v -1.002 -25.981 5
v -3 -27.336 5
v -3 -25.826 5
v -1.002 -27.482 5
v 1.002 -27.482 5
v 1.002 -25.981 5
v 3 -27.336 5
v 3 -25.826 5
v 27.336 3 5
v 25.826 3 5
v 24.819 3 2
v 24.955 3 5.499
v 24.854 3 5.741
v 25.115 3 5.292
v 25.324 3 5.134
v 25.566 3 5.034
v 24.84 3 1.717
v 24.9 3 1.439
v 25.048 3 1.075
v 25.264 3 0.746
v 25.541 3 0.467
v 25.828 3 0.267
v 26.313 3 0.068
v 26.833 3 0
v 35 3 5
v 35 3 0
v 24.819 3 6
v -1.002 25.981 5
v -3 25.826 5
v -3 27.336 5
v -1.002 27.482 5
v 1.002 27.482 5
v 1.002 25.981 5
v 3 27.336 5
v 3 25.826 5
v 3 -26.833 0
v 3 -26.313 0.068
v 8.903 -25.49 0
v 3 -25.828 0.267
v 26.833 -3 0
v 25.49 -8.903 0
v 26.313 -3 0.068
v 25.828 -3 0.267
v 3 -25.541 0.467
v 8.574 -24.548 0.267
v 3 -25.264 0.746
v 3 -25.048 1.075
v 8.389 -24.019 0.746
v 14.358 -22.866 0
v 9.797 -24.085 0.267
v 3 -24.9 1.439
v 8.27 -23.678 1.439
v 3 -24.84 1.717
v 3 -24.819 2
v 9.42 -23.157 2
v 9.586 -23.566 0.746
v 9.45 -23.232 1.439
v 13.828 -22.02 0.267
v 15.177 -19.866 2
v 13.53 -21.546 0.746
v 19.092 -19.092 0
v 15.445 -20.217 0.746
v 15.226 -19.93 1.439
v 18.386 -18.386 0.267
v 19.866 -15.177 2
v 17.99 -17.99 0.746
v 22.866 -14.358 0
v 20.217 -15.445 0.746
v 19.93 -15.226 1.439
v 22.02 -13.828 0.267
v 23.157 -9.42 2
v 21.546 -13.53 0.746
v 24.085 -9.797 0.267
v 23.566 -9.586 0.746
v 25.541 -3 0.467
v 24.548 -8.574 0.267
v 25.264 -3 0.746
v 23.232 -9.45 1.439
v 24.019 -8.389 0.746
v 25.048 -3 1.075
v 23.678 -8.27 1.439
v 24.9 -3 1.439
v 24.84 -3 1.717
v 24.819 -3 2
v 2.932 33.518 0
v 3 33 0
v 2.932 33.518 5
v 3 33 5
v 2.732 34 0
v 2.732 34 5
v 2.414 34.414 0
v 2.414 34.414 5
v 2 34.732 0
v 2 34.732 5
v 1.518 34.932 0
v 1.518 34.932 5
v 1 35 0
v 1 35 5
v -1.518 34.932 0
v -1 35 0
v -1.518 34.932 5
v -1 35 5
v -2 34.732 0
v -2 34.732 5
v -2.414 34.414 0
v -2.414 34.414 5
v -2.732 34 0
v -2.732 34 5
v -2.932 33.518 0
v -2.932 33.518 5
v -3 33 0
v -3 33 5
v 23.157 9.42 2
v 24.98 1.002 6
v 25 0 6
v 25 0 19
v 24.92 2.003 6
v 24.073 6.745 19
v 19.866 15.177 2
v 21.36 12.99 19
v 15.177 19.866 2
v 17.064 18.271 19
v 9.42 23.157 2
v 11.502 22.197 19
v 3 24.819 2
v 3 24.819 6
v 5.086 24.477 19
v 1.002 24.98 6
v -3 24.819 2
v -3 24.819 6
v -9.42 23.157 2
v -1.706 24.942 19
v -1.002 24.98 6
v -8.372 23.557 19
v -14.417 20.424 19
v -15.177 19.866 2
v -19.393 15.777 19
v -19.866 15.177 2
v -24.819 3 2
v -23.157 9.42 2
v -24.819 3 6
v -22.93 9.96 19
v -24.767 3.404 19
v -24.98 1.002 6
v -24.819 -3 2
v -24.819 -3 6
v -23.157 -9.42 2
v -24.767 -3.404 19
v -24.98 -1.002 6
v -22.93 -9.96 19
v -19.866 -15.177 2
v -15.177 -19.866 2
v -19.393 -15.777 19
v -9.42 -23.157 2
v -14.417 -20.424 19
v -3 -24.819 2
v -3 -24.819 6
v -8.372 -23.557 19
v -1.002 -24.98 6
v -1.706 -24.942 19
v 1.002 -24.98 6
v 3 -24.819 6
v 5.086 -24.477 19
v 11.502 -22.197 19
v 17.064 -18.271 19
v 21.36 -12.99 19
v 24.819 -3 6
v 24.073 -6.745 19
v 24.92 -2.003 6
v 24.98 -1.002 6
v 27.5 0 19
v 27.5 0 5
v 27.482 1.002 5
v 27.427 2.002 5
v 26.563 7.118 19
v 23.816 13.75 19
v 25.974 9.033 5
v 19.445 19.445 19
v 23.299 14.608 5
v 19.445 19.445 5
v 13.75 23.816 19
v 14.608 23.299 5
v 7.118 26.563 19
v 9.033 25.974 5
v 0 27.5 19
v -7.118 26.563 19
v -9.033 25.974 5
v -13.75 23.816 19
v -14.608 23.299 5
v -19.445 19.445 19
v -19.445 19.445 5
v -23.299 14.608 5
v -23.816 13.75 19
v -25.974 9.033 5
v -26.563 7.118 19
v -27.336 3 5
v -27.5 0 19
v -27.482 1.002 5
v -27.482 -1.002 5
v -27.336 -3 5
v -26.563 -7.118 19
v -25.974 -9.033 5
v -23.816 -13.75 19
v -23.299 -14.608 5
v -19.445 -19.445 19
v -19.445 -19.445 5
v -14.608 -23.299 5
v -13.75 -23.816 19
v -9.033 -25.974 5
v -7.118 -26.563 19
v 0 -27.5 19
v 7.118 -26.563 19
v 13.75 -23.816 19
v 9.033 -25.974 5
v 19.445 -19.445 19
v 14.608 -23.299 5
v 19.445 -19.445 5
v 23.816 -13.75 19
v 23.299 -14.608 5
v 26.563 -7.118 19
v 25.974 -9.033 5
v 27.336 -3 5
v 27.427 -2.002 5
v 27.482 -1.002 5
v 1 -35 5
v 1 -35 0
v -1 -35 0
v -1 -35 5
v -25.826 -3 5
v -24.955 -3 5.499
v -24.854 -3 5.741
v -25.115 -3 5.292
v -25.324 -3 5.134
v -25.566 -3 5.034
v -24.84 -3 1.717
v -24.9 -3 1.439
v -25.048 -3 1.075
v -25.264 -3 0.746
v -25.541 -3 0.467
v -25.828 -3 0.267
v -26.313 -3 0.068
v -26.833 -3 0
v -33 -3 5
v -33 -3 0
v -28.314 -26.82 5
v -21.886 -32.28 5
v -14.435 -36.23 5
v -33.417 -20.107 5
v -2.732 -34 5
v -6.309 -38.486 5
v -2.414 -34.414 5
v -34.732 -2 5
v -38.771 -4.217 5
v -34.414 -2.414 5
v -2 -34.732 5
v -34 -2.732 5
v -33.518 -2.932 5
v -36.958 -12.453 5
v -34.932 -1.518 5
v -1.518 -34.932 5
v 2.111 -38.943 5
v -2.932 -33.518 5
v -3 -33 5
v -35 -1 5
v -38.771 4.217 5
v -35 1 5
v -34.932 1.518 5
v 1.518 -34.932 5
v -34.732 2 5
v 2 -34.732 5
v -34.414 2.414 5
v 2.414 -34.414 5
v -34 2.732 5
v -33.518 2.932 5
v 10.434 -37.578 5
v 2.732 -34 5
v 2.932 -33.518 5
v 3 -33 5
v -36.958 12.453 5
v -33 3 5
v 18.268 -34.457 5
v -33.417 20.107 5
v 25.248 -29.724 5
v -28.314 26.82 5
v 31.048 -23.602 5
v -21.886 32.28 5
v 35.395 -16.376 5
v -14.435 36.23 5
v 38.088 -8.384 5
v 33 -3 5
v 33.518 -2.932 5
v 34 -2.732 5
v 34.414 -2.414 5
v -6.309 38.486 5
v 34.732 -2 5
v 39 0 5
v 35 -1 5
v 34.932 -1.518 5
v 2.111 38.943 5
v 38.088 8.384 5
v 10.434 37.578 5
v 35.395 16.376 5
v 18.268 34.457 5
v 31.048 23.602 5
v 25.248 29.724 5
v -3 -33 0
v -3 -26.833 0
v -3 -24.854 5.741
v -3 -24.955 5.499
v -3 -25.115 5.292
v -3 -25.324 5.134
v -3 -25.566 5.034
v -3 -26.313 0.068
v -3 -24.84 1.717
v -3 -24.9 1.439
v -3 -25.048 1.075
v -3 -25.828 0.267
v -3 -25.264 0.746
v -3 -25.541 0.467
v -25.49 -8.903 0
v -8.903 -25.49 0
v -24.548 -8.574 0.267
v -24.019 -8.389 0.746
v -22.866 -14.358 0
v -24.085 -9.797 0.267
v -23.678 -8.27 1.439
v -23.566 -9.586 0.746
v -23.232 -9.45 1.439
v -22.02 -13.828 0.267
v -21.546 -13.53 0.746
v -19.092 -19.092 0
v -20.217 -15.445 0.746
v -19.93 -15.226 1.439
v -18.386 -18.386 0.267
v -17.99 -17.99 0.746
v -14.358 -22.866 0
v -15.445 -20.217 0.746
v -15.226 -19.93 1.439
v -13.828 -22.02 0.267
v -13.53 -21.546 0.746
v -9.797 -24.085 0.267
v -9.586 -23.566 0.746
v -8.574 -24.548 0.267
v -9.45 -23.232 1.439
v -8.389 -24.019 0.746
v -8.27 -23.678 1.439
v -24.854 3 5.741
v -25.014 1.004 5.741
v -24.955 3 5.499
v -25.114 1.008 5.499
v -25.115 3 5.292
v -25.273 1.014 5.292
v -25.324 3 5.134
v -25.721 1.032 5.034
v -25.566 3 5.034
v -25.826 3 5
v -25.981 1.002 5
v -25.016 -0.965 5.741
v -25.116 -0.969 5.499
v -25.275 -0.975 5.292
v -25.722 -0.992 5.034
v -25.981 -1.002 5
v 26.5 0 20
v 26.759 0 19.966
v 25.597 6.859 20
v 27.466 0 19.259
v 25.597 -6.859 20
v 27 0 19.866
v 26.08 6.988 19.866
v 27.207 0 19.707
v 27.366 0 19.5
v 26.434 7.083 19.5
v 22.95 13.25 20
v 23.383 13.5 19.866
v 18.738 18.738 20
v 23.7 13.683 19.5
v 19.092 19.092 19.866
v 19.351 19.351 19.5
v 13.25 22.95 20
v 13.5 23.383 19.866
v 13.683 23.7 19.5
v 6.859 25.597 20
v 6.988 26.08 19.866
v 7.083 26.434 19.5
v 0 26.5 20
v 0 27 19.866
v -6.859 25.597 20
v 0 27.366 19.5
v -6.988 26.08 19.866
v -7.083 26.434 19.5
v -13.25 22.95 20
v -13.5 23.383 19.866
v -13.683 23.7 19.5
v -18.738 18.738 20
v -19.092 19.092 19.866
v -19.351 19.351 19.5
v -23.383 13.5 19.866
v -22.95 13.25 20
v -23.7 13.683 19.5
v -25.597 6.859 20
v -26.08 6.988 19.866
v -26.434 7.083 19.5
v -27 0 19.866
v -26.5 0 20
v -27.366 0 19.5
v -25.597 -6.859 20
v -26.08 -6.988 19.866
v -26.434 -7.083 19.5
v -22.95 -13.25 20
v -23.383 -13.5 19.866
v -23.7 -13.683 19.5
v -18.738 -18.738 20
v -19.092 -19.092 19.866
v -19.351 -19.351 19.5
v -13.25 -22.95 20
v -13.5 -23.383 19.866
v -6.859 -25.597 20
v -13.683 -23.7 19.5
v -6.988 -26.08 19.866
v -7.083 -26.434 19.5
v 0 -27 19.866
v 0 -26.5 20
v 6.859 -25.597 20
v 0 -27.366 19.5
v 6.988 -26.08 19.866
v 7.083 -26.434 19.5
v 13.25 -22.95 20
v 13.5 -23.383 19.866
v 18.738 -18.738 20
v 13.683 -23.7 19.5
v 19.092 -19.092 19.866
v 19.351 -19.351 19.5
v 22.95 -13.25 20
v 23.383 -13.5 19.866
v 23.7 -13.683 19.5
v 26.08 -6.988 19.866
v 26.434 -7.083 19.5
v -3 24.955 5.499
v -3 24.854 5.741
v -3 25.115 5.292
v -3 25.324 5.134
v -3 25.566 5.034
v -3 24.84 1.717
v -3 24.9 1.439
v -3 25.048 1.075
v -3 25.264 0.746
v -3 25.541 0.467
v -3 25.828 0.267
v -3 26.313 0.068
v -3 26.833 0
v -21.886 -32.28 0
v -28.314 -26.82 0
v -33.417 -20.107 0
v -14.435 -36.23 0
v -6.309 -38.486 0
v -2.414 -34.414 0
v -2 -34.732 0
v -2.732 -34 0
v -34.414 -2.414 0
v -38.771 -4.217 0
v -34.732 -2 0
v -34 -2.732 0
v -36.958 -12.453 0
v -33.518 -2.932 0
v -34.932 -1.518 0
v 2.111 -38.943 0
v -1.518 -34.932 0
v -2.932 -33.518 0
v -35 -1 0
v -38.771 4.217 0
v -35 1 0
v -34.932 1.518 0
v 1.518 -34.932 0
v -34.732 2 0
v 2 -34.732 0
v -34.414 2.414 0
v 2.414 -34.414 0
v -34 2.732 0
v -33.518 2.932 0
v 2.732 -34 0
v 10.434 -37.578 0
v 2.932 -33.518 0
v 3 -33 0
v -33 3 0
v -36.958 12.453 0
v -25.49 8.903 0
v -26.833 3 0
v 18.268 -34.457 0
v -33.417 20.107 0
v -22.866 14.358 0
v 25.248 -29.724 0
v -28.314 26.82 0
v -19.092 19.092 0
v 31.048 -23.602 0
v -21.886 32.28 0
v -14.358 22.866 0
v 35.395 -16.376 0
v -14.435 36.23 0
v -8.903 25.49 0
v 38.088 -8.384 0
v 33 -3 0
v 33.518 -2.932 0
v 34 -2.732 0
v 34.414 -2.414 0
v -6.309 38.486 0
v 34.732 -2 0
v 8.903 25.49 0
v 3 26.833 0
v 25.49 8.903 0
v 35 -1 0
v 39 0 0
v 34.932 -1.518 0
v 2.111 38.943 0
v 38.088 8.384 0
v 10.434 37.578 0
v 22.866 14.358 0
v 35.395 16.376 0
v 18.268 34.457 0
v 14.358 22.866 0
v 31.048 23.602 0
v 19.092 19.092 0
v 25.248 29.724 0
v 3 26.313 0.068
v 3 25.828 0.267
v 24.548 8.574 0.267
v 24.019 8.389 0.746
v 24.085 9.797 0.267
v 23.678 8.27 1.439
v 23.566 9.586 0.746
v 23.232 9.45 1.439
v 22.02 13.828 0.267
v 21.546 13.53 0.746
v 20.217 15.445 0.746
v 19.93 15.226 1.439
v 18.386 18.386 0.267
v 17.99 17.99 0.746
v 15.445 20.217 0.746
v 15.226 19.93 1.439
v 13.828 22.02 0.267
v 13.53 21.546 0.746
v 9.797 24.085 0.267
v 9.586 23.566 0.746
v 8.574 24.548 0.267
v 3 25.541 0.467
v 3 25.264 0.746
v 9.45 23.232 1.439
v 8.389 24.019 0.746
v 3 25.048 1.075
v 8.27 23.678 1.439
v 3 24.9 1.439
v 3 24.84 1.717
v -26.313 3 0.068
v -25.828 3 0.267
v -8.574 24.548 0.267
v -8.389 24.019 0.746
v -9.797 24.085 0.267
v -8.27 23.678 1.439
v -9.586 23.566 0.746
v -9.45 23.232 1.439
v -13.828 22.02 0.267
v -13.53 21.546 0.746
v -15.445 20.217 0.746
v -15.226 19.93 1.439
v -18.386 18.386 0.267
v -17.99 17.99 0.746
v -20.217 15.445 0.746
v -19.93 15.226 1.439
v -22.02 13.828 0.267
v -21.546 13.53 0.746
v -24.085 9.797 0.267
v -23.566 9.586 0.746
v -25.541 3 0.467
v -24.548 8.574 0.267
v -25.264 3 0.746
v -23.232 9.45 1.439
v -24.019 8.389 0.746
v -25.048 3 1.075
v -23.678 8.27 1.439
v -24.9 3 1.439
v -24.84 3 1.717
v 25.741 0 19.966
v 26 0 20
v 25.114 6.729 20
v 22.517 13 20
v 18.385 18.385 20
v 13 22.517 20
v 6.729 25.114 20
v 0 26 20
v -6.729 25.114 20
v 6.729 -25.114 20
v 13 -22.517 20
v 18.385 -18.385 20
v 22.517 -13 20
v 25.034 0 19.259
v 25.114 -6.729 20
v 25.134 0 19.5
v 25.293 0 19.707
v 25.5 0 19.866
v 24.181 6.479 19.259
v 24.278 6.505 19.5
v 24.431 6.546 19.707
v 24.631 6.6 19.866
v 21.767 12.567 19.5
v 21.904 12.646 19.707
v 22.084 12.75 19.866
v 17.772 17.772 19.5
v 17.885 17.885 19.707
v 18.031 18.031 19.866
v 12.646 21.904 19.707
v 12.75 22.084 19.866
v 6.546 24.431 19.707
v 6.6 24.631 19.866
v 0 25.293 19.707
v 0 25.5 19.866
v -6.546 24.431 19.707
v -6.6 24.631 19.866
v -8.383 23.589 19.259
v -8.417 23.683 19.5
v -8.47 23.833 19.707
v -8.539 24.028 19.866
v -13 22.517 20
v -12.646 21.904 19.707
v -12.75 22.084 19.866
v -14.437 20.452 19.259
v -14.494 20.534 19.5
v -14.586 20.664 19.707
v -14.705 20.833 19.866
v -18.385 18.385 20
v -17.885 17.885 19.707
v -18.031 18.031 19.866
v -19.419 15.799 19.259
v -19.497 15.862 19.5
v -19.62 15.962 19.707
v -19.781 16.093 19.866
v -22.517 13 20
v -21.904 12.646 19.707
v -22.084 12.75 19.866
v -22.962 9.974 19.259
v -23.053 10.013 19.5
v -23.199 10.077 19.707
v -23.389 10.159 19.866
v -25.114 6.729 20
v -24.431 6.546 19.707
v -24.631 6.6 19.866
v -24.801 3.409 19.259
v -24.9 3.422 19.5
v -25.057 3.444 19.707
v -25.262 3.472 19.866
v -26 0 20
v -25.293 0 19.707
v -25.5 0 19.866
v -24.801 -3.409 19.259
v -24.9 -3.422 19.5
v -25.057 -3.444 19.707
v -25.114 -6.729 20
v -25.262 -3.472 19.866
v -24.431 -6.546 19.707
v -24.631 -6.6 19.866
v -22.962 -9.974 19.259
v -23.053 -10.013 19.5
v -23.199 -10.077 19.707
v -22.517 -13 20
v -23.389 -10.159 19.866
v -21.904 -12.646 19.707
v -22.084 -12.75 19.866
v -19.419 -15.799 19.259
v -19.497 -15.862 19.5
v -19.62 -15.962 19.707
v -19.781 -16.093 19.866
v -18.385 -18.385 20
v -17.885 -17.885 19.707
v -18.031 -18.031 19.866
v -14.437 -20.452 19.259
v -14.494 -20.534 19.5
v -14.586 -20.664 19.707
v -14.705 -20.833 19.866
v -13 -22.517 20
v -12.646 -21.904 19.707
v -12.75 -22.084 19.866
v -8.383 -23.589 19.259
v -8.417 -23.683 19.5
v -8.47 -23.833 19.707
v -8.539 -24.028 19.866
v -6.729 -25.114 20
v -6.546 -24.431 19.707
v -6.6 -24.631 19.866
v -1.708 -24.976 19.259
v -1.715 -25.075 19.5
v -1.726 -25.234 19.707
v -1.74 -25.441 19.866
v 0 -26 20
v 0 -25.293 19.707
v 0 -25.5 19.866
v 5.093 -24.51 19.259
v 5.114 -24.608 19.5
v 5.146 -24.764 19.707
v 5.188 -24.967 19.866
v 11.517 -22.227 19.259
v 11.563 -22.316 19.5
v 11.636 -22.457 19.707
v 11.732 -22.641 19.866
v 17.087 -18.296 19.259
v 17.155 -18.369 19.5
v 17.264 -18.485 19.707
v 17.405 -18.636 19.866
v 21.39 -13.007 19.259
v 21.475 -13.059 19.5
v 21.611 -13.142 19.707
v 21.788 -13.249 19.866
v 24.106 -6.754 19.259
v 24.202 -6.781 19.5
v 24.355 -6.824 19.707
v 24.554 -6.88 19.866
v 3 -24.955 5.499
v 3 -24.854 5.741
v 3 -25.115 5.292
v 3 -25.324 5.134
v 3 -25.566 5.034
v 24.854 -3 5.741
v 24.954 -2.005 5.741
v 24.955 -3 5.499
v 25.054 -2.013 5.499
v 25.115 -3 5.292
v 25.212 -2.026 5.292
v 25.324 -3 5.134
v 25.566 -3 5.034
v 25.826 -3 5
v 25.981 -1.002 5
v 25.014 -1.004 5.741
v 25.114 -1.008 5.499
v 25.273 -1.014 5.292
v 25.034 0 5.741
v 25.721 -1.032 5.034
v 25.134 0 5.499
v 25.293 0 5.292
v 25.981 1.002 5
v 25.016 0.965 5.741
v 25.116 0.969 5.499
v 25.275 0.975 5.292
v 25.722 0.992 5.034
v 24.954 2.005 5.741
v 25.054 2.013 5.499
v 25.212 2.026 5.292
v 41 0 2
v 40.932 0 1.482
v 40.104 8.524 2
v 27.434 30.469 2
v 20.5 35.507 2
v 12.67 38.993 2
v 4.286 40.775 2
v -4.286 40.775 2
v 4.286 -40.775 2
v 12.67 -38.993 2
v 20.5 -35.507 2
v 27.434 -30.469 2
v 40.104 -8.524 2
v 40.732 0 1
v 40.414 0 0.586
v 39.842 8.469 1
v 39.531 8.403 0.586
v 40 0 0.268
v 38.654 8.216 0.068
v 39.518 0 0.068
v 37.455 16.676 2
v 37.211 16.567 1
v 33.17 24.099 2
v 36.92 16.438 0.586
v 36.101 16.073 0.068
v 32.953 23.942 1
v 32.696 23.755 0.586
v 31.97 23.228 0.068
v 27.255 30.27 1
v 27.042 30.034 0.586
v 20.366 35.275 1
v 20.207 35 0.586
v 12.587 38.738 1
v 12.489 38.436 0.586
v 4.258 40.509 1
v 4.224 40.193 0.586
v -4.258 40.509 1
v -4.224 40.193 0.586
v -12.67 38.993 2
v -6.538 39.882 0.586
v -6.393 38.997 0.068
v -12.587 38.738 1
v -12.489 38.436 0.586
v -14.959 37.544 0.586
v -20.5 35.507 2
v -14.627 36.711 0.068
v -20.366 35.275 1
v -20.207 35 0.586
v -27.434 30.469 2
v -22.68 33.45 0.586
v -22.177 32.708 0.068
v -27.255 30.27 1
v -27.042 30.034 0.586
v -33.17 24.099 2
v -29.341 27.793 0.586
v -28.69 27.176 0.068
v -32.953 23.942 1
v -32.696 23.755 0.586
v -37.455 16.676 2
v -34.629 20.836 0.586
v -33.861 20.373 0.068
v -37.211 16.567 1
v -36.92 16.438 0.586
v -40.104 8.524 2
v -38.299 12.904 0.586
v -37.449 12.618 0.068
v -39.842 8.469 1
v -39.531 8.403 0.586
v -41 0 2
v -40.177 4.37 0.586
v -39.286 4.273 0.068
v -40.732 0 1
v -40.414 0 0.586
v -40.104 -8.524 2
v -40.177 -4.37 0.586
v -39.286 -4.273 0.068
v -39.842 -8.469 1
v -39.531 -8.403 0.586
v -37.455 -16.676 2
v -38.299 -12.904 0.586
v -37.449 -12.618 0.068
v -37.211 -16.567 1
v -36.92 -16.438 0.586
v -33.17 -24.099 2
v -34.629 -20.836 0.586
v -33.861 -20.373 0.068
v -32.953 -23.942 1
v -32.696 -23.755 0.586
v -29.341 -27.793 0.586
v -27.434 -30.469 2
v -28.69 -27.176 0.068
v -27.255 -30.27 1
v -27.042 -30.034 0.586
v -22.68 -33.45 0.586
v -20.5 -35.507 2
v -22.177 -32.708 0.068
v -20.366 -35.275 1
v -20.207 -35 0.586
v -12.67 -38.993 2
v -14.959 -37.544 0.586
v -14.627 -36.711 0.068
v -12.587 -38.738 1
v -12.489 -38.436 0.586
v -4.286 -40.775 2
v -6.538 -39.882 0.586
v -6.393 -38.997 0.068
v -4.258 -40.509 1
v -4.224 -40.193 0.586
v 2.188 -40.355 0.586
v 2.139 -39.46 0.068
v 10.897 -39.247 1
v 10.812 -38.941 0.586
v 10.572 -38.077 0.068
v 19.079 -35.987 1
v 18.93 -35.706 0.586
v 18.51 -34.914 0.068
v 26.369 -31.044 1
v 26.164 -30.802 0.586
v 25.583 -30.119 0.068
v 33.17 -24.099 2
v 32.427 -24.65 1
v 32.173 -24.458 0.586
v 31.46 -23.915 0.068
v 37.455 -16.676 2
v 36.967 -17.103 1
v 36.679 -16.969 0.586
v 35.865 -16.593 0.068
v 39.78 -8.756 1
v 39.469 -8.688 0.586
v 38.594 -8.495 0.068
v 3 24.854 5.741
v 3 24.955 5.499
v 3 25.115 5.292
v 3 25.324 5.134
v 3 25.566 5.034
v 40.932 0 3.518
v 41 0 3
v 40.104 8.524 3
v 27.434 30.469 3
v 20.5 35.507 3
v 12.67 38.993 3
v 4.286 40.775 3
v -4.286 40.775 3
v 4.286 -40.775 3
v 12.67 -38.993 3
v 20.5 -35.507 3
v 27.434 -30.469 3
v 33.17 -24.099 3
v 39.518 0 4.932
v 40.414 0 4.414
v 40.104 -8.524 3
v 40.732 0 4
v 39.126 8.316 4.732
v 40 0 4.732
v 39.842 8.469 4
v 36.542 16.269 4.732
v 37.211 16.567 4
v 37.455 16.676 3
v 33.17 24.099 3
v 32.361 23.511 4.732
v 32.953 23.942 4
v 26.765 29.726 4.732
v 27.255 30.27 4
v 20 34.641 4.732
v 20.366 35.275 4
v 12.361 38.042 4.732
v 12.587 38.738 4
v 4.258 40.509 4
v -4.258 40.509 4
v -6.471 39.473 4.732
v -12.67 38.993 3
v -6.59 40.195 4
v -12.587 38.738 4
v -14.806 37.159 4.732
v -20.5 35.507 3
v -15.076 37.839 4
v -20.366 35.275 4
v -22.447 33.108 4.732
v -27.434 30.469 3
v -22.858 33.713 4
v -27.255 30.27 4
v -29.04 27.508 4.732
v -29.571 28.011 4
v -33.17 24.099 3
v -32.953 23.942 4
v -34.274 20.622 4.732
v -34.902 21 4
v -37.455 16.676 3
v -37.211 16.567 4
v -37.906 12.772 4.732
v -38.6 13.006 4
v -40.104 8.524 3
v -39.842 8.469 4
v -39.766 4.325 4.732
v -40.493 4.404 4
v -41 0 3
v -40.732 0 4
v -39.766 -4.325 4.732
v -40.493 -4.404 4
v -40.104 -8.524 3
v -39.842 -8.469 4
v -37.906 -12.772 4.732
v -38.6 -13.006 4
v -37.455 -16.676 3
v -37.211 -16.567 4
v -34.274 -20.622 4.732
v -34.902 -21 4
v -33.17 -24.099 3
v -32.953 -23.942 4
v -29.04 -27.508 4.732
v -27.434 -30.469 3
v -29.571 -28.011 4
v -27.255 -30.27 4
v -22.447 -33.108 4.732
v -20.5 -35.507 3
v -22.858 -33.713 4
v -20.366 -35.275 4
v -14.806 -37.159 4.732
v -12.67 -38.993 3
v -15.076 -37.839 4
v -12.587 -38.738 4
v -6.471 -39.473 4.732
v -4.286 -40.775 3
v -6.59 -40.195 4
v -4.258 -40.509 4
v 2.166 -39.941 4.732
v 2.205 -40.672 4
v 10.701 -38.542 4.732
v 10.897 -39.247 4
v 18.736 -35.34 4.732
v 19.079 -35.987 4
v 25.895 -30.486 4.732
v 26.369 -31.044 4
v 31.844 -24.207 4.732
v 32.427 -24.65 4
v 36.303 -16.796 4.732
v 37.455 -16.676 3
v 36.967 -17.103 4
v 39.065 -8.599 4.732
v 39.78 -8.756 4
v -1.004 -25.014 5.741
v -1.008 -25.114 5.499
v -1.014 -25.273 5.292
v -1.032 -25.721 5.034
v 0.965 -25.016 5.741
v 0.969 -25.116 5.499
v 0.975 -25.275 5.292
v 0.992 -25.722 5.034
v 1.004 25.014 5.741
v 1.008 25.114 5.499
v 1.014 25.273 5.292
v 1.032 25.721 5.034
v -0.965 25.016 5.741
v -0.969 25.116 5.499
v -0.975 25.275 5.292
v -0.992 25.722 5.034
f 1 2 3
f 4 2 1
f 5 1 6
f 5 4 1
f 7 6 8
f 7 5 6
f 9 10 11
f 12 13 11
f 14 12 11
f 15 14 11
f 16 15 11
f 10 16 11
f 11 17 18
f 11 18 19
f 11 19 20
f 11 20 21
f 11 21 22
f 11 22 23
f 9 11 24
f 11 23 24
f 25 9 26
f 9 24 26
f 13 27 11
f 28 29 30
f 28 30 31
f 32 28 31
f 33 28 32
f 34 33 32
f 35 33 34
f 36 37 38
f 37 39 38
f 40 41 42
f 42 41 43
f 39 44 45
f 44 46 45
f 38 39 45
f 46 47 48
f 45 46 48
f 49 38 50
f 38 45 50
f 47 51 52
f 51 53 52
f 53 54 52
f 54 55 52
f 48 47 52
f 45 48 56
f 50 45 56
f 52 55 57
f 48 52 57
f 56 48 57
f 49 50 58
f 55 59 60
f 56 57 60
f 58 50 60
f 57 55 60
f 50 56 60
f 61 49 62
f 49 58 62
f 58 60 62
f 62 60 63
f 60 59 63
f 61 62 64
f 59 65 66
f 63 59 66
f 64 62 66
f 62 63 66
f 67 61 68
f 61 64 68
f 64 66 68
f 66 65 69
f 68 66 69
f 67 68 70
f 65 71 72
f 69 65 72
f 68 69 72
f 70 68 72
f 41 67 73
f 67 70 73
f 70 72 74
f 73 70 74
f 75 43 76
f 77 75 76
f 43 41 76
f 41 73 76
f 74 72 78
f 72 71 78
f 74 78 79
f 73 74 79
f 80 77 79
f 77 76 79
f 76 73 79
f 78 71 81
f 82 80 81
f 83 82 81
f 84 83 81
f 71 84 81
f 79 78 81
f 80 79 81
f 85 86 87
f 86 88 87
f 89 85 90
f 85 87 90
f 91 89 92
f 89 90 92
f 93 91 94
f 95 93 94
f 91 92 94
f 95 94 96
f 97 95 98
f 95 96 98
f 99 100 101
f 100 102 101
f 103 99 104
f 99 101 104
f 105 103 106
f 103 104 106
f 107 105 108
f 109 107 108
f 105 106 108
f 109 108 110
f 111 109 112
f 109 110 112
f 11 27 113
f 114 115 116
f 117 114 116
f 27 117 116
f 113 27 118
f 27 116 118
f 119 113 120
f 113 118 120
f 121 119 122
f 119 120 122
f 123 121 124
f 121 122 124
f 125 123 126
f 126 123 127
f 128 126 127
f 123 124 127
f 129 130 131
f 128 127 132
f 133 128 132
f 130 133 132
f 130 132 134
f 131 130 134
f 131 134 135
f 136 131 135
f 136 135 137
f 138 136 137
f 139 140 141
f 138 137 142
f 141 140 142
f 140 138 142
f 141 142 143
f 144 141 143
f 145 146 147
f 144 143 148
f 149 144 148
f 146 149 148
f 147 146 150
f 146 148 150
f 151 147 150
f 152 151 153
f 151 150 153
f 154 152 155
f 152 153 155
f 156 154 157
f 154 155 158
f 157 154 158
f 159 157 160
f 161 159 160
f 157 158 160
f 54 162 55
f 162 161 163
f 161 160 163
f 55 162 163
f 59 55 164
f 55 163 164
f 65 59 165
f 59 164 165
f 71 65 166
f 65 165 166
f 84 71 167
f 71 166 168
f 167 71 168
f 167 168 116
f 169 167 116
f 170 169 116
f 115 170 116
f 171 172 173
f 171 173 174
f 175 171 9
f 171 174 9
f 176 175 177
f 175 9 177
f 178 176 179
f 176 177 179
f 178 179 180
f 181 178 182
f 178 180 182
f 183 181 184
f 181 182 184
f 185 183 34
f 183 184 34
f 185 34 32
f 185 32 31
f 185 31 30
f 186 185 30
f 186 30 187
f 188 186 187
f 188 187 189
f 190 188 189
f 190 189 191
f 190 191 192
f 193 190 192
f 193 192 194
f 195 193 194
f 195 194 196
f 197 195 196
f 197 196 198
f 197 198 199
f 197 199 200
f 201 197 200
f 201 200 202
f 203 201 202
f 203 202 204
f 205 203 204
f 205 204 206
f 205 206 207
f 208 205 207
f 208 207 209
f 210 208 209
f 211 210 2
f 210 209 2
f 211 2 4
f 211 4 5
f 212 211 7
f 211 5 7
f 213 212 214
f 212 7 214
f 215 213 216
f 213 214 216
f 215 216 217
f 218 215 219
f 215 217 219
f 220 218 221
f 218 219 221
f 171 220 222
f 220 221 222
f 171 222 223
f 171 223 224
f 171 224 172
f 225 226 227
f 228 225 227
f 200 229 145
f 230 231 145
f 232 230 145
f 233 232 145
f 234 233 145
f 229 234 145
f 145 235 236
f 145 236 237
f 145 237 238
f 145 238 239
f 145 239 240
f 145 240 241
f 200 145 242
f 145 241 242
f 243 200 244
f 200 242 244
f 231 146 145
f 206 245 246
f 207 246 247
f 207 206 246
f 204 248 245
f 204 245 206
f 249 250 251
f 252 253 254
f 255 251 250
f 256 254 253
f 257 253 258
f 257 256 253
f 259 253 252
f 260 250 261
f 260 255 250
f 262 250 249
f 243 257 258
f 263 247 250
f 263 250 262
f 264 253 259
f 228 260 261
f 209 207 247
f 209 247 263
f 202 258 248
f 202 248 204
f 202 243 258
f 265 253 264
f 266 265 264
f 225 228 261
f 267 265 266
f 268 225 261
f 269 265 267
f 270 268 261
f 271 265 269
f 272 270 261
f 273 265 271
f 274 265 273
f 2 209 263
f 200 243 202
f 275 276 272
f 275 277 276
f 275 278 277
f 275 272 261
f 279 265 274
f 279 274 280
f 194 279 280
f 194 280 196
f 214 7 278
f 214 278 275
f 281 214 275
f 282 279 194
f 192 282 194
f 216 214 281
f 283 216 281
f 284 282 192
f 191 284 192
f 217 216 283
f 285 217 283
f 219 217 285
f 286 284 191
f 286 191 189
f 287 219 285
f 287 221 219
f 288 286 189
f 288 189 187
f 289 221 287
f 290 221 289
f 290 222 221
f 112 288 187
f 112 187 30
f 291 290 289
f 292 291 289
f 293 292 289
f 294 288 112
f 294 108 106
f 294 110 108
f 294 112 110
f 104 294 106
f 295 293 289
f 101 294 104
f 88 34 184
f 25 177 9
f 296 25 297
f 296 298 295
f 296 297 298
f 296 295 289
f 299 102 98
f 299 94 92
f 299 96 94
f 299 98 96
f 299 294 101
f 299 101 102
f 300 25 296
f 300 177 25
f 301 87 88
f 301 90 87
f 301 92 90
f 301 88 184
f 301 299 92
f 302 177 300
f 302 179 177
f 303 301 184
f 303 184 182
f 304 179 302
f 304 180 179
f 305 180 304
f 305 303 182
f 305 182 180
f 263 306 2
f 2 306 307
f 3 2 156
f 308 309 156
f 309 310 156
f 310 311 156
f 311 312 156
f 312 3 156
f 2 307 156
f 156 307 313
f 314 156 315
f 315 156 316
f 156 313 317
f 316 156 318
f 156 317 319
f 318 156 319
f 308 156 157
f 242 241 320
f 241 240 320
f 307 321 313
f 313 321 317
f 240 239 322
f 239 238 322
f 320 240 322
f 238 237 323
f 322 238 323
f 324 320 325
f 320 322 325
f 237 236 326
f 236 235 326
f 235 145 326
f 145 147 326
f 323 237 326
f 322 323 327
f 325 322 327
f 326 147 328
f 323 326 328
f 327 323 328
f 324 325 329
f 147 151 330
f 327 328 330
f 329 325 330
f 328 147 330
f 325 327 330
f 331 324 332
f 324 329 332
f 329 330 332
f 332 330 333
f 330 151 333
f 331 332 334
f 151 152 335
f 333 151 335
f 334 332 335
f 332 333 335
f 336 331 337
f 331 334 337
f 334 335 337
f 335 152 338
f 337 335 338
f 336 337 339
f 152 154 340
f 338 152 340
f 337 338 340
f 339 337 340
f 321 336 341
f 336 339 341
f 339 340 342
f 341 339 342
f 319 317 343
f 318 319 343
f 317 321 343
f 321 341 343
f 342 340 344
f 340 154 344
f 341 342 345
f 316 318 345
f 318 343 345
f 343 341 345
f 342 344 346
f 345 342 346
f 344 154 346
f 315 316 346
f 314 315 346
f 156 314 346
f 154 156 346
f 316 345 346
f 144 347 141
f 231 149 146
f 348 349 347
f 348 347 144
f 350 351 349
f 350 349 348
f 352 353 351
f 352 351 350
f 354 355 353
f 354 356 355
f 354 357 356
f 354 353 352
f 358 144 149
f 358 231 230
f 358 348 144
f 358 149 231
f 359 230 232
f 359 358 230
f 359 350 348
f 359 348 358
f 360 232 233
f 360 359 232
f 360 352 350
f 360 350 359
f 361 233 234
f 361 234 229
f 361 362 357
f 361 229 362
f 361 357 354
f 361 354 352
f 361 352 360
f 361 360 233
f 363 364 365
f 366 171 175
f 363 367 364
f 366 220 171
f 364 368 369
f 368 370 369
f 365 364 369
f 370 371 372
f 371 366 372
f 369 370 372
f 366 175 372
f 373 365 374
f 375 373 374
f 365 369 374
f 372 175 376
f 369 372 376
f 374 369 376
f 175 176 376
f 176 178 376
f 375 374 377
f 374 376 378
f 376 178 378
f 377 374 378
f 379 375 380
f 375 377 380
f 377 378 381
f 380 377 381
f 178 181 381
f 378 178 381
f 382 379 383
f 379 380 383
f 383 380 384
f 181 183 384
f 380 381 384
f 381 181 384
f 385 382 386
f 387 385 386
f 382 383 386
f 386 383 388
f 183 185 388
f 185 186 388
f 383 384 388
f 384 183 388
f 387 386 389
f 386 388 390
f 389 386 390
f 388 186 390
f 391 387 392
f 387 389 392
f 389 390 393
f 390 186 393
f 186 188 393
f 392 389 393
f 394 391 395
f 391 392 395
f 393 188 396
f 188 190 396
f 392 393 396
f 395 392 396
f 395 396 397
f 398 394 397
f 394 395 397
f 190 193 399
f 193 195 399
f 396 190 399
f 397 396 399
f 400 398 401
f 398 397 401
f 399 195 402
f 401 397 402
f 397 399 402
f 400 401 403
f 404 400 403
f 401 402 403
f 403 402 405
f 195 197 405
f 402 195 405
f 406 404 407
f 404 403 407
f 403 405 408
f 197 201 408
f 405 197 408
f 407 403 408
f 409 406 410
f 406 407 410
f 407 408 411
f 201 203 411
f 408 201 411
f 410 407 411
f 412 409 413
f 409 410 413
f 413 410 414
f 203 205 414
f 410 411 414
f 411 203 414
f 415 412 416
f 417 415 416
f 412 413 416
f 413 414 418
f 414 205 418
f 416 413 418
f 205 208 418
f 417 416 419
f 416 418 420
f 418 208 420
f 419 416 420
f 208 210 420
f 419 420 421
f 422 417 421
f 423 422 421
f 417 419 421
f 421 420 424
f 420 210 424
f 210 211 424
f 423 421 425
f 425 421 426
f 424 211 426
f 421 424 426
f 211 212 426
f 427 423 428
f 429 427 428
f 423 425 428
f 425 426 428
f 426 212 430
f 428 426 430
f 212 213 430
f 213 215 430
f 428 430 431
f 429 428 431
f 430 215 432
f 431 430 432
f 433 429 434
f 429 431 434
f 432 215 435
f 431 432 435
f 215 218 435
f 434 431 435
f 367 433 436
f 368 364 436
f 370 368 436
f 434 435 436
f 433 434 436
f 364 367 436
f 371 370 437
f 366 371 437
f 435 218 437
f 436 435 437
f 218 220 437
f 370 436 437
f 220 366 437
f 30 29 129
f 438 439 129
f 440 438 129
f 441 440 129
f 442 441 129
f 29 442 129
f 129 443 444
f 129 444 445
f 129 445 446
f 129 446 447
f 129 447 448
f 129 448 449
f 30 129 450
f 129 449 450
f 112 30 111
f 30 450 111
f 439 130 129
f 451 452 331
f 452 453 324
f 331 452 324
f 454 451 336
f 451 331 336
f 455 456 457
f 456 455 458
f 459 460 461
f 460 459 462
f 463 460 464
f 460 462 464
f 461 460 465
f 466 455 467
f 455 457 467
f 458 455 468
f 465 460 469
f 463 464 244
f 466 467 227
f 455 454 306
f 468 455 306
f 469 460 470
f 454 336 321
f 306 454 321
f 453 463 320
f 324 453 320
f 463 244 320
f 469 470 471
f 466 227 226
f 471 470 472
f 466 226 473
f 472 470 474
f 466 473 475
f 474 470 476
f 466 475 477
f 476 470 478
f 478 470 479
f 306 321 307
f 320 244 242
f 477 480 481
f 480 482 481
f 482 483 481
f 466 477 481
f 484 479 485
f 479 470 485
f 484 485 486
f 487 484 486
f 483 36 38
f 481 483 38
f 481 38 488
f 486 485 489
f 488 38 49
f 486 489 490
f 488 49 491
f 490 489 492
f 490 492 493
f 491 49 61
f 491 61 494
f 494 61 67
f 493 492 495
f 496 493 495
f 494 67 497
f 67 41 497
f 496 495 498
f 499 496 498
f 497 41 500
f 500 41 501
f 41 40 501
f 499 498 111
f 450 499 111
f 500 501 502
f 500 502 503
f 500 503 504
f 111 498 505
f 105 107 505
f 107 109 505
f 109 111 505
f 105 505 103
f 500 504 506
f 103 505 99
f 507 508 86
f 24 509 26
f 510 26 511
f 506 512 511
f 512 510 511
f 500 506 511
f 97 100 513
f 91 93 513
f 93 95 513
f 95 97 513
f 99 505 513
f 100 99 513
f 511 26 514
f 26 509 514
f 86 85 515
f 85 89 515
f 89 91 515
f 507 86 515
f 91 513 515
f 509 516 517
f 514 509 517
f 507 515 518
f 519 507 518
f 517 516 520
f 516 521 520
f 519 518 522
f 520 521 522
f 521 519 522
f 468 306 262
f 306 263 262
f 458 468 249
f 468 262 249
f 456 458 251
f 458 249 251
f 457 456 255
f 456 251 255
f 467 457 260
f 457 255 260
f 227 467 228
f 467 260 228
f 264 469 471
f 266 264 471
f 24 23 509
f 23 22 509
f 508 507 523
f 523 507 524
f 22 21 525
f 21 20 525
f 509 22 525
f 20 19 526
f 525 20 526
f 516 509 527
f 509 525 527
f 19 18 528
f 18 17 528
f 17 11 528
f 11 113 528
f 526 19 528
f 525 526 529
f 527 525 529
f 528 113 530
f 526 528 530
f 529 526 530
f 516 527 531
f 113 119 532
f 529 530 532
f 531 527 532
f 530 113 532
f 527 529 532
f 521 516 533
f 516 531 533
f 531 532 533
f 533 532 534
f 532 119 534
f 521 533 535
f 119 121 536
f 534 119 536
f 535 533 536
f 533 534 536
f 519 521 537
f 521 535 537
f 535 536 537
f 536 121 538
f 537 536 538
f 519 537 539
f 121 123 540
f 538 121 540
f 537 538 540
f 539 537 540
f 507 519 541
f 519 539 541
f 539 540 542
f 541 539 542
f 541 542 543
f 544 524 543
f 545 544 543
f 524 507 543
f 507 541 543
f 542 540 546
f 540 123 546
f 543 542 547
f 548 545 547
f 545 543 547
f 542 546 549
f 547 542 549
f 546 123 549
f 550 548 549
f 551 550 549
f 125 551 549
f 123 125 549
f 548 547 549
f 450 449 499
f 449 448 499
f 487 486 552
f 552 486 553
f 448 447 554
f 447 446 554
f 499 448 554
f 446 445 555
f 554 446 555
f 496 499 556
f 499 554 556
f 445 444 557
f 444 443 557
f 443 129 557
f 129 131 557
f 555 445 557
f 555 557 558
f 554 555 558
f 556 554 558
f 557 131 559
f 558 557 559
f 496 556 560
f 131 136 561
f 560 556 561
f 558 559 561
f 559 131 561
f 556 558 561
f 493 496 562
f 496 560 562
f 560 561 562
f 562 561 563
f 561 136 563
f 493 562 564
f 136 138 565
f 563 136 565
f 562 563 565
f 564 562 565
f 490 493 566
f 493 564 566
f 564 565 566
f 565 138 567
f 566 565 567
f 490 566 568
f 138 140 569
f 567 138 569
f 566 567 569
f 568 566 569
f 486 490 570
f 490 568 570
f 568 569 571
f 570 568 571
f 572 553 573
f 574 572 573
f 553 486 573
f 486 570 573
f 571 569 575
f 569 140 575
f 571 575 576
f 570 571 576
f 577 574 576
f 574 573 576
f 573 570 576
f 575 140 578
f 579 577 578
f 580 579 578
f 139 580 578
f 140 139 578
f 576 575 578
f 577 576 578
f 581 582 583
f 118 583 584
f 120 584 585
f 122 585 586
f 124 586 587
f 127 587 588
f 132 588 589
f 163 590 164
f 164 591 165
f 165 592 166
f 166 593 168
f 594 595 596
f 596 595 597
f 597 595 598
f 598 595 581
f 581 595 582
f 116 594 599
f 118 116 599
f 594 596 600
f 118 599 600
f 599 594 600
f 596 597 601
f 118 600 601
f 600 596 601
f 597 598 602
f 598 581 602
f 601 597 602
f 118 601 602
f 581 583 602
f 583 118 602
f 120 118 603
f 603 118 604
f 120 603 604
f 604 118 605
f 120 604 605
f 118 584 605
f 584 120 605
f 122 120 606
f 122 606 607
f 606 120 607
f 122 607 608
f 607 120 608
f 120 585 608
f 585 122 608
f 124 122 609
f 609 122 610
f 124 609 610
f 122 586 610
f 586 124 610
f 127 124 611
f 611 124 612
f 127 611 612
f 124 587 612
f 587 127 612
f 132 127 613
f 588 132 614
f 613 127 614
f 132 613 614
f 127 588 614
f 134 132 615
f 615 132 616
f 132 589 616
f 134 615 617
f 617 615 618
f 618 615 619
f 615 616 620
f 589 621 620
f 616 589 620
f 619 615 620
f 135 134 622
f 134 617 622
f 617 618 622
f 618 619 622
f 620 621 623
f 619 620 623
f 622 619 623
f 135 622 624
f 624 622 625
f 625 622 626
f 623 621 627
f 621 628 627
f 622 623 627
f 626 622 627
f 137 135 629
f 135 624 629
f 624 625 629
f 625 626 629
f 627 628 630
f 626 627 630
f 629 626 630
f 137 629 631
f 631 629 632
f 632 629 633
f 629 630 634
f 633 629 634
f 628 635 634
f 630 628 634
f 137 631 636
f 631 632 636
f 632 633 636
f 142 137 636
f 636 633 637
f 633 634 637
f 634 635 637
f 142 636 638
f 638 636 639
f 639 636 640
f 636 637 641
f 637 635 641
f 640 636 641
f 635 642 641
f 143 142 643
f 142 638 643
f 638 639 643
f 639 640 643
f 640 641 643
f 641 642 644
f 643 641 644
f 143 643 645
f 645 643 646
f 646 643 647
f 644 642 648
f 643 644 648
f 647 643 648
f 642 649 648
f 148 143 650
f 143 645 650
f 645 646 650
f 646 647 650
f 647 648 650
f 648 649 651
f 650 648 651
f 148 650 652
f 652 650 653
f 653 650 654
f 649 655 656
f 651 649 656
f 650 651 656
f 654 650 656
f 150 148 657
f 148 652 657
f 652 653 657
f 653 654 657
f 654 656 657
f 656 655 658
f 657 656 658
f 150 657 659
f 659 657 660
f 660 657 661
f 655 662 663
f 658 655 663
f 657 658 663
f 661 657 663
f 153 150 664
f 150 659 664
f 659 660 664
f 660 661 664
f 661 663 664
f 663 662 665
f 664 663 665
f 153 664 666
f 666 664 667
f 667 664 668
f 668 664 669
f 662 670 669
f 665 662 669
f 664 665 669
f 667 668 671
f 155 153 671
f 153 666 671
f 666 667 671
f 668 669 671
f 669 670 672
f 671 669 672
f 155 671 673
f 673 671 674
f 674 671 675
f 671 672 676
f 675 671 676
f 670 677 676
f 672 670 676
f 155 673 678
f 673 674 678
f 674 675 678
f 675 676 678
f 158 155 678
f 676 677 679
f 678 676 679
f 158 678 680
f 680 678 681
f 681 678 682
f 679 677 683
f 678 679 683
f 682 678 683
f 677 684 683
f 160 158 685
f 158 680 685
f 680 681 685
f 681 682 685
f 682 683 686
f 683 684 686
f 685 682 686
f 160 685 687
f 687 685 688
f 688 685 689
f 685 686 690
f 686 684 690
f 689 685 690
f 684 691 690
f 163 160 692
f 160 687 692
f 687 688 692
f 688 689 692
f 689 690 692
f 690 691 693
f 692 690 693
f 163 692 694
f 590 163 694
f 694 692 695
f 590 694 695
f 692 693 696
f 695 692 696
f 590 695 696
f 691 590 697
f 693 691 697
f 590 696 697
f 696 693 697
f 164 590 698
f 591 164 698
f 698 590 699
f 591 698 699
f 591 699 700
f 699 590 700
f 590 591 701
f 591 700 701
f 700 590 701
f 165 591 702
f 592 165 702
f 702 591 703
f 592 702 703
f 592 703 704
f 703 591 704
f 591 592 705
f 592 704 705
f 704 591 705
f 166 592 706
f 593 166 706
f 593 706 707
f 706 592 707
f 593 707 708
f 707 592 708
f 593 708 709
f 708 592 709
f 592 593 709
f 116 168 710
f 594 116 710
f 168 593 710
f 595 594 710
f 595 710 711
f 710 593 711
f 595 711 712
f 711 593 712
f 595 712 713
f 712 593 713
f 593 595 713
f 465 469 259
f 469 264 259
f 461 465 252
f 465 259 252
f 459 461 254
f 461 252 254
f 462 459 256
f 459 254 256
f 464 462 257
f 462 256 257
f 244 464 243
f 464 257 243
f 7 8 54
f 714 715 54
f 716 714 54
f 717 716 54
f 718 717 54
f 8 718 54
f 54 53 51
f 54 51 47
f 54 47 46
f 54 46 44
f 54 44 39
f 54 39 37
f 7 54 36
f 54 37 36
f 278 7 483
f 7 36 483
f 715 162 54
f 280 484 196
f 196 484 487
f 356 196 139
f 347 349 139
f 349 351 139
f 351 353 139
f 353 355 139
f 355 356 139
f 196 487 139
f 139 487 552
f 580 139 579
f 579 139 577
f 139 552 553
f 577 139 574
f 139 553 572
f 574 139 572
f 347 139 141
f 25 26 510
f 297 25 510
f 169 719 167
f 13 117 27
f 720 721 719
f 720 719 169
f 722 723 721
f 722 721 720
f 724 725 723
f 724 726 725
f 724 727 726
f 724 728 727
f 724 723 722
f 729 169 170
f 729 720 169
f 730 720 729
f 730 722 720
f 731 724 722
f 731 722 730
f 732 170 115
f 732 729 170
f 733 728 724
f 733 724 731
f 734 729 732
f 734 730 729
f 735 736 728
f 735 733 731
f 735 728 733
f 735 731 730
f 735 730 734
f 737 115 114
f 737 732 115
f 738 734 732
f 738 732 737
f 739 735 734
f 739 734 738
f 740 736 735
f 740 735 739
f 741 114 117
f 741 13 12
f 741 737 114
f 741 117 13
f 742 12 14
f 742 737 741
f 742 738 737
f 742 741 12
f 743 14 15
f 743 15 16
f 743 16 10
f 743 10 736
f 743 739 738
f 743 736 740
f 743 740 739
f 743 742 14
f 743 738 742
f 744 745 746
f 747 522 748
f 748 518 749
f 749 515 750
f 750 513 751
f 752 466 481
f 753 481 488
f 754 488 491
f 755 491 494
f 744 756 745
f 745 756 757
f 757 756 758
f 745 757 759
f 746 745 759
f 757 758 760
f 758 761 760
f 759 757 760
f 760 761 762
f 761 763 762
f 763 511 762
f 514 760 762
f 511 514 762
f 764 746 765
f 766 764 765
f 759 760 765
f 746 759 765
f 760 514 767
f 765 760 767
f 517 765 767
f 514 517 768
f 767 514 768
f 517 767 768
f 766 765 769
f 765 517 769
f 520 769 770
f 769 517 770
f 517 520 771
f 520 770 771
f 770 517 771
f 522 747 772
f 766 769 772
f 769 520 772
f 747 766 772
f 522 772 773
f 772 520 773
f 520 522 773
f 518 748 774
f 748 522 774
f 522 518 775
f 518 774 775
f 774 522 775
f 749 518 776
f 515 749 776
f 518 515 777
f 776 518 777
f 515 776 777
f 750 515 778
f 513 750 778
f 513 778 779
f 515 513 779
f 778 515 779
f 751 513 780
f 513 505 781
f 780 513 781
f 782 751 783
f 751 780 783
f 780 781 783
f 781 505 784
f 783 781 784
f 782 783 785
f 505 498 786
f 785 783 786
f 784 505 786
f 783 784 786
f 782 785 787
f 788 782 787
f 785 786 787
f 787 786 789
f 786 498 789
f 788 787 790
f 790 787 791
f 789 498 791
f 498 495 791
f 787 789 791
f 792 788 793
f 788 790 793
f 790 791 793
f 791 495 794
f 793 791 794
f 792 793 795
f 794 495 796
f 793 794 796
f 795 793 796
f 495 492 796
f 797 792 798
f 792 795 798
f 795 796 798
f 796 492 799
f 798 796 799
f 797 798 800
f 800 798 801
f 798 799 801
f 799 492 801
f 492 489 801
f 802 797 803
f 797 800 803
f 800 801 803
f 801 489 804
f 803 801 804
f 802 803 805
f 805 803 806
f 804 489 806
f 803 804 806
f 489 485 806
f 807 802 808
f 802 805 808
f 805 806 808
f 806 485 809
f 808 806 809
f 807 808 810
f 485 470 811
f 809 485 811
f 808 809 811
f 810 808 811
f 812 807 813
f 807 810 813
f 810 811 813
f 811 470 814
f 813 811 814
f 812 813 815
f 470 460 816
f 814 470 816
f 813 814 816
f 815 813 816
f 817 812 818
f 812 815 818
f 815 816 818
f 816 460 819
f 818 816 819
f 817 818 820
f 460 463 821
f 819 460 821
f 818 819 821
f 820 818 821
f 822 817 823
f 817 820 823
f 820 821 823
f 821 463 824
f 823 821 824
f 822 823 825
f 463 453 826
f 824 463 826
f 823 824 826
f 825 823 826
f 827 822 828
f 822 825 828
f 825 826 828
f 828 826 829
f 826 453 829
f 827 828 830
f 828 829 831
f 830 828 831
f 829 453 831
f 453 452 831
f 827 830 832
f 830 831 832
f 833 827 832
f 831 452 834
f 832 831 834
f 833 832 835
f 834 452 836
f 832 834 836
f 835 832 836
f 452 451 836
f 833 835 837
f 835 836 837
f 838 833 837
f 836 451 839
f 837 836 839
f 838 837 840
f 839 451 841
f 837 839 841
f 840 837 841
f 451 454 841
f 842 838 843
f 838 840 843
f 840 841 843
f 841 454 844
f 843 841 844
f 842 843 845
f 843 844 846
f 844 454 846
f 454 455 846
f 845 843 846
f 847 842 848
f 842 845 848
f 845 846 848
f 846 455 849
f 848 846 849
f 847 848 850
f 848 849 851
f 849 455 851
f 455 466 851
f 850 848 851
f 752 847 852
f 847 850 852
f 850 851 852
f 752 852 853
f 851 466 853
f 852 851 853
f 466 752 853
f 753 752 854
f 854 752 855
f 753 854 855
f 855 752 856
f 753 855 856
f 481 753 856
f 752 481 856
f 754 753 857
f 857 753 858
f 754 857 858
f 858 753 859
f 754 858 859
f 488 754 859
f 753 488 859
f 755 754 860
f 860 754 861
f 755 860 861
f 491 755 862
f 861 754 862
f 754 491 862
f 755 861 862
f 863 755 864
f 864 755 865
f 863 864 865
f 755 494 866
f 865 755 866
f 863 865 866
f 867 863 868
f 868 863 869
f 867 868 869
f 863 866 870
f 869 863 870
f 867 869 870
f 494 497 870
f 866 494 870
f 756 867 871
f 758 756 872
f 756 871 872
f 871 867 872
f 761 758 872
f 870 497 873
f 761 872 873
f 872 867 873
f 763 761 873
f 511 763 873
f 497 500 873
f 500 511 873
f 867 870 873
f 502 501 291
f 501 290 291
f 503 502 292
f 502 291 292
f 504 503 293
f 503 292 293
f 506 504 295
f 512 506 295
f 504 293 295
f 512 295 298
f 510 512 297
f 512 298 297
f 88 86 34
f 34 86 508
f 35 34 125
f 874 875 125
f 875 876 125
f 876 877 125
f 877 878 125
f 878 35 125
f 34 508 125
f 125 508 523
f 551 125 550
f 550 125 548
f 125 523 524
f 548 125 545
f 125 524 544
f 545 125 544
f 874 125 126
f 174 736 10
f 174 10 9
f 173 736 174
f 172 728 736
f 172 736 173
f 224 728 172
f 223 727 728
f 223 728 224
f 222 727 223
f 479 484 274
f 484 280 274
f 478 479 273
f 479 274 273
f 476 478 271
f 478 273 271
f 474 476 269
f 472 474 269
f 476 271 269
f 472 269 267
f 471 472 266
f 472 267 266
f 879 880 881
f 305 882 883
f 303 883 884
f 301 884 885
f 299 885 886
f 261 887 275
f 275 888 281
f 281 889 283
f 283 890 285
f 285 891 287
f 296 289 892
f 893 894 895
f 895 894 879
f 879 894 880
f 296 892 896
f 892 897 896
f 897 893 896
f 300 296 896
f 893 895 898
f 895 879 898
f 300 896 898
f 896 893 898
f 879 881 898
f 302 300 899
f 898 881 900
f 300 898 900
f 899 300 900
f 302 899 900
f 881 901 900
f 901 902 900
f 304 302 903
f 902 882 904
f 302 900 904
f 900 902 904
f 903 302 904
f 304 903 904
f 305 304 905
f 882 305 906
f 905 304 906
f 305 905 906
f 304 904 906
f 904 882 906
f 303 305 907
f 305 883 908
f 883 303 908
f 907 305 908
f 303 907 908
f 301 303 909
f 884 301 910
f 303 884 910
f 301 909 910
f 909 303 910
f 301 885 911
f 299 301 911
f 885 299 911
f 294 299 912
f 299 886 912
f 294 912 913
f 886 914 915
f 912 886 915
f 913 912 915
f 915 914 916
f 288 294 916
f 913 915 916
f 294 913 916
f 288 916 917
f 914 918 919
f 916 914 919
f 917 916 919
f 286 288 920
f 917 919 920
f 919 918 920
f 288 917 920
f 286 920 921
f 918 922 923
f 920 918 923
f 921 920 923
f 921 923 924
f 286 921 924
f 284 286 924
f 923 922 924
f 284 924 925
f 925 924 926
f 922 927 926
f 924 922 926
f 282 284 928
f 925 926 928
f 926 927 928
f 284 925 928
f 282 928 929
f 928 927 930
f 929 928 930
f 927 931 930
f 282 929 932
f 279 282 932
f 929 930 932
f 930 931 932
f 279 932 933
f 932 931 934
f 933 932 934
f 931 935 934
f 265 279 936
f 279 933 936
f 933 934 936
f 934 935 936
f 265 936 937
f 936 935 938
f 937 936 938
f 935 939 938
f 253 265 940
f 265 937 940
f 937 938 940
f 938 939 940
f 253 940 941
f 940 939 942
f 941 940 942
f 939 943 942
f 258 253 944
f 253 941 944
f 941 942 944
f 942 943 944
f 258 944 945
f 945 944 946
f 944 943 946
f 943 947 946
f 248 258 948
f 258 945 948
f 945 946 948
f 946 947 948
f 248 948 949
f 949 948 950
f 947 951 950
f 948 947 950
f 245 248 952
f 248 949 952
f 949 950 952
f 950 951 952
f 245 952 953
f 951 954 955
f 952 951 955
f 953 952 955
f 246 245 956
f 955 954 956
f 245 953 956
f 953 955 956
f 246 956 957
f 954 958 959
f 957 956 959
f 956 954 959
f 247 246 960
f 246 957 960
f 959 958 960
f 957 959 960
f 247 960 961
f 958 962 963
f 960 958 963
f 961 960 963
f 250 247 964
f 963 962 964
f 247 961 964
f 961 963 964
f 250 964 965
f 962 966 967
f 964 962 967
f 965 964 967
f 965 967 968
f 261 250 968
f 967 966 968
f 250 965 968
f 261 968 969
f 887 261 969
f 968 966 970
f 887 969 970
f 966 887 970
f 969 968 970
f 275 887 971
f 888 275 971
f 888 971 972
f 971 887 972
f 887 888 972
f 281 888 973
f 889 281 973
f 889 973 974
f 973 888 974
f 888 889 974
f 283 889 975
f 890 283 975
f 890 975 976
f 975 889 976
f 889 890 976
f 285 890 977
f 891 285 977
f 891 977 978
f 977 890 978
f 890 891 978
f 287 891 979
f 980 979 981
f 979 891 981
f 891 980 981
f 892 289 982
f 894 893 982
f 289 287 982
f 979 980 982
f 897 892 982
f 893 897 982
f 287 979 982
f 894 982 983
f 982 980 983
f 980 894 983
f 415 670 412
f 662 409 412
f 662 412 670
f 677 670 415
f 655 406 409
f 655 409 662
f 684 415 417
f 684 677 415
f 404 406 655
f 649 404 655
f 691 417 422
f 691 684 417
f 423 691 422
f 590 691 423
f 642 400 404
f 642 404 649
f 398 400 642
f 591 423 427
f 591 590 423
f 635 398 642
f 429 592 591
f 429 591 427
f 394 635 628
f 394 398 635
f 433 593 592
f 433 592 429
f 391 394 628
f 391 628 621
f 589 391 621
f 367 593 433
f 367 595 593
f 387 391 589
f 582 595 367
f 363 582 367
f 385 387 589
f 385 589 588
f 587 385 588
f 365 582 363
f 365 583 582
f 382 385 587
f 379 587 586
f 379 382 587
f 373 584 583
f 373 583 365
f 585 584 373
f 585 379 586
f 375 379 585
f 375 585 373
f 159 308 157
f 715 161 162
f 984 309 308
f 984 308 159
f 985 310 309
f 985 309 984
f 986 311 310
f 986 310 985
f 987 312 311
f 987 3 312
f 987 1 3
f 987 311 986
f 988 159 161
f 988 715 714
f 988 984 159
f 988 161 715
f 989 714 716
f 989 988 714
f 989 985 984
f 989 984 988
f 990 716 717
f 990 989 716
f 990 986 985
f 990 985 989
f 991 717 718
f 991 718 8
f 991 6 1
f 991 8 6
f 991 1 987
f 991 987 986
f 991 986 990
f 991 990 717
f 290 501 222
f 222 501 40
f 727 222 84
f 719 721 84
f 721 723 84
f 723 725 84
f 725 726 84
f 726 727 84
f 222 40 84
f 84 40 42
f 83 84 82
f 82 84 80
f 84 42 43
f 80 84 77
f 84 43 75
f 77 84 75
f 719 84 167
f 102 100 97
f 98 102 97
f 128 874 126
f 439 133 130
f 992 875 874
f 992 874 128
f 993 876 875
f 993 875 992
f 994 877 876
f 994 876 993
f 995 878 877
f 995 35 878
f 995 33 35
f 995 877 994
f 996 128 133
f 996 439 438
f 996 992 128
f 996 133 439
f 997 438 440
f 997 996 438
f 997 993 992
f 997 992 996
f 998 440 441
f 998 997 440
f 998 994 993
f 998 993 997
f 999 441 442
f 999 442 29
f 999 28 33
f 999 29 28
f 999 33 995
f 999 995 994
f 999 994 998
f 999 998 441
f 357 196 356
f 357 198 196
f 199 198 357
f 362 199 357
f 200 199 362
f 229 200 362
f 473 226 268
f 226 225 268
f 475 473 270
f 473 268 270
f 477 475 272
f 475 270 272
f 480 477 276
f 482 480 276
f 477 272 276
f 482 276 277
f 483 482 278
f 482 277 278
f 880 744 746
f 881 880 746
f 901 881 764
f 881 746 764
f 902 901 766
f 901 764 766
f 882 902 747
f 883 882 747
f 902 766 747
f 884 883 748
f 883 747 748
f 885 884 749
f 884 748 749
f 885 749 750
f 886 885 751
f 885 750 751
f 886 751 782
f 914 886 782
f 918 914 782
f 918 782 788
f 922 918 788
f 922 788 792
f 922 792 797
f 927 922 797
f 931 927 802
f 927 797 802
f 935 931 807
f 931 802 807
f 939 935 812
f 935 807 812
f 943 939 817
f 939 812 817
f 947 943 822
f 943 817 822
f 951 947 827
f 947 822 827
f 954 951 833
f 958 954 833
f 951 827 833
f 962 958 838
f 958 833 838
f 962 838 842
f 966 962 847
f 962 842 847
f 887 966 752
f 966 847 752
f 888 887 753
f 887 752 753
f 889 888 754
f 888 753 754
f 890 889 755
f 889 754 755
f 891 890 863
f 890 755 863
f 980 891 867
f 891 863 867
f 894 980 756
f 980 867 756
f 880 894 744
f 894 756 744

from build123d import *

# Parameters (mm, degrees)
SKETCH_R        = 41
PAD_DEPTH       = 5
SKETCH001_R     = 27.5
PAD001_DEPTH    = 15
SKETCH002_R     = 25
POCKET_DEPTH    = 20.001
POCKET001_DEPTH = 5
FILLET_R        = 2
FILLET001_R     = 2
FILLET002_R     = 1
FILLET003_R     = 2


with BuildPart() as part:
    # Sketch → Pad (new body)
    with BuildSketch(Plane.XY):
        Circle(SKETCH_R)
    extrude(amount=PAD_DEPTH)

    # Sketch001 (on Face3 of Pad) → Pad001 (join)
    with BuildSketch(Plane.XY.offset(5)):
        Circle(SKETCH001_R)
    extrude(amount=PAD001_DEPTH)

    # Sketch002 (on Face5 of Pad001) → Pocket (cut, through all)
    with BuildSketch(Plane.XY.offset(20)):
        Circle(SKETCH002_R)
    extrude(amount=-POCKET_DEPTH, mode=Mode.SUBTRACT)

    # Sketch003 (on Face2 of Pocket) → Pocket001 (cut)
    with BuildSketch(Plane(origin=(0, 0, 0), x_dir=(1, 0, 0), z_dir=(0, 0, -1))):
        Polygon((-3, 35), (-3, 3), (-35, 3), (-35, -3), (-3, -3), (-3, -35), (3, -35), (3, -3), (35, -3), (35, 3), (3, 3), (3, 35), align=None)
    extrude(amount=-POCKET001_DEPTH, mode=Mode.SUBTRACT)

    # Fillet
    fillet_edges = [part.edges().sort_by_distance(p)[0] for p in [
        (-3, -35, 2.5),
        (3, -35, 2.5),
        (35, -3, 2.5),
        (-35, -3, 2.5),
        (-35, 3, 2.5),
        (-3, 35, 2.5),
        (3, 35, 2.5),
    ]]
    fillet(fillet_edges, radius=FILLET_R)

    # Fillet001
    fillet001_edges = [part.edges().sort_by_distance(p)[0] for p in [
        (17.67767, -17.67767, 0),
        (17.67767, 17.67767, 0),
        (-17.67767, 17.67767, 0),
        (-17.67767, -17.67767, 0),
    ]]
    fillet(fillet001_edges, radius=FILLET001_R)

    # Fillet002
    fillet002_edges = [part.edges().sort_by_distance(p)[0] for p in [
        (-27.5, 0, 20),
        (-25, 0, 20),
        (0, -25, 5),
        (24.954796, -1.502717, 5),
        (0, 25, 5),
        (-25, 0, 5),
    ]]
    fillet(fillet002_edges, radius=FILLET002_R)

    # Fillet003
    fillet003_edges = [part.edges().sort_by_distance(p)[0] for p in [
        (-41, 0, 5),
        (-41, 0, 0),
    ]]
    fillet(fillet003_edges, radius=FILLET003_R)


solid = part.part
